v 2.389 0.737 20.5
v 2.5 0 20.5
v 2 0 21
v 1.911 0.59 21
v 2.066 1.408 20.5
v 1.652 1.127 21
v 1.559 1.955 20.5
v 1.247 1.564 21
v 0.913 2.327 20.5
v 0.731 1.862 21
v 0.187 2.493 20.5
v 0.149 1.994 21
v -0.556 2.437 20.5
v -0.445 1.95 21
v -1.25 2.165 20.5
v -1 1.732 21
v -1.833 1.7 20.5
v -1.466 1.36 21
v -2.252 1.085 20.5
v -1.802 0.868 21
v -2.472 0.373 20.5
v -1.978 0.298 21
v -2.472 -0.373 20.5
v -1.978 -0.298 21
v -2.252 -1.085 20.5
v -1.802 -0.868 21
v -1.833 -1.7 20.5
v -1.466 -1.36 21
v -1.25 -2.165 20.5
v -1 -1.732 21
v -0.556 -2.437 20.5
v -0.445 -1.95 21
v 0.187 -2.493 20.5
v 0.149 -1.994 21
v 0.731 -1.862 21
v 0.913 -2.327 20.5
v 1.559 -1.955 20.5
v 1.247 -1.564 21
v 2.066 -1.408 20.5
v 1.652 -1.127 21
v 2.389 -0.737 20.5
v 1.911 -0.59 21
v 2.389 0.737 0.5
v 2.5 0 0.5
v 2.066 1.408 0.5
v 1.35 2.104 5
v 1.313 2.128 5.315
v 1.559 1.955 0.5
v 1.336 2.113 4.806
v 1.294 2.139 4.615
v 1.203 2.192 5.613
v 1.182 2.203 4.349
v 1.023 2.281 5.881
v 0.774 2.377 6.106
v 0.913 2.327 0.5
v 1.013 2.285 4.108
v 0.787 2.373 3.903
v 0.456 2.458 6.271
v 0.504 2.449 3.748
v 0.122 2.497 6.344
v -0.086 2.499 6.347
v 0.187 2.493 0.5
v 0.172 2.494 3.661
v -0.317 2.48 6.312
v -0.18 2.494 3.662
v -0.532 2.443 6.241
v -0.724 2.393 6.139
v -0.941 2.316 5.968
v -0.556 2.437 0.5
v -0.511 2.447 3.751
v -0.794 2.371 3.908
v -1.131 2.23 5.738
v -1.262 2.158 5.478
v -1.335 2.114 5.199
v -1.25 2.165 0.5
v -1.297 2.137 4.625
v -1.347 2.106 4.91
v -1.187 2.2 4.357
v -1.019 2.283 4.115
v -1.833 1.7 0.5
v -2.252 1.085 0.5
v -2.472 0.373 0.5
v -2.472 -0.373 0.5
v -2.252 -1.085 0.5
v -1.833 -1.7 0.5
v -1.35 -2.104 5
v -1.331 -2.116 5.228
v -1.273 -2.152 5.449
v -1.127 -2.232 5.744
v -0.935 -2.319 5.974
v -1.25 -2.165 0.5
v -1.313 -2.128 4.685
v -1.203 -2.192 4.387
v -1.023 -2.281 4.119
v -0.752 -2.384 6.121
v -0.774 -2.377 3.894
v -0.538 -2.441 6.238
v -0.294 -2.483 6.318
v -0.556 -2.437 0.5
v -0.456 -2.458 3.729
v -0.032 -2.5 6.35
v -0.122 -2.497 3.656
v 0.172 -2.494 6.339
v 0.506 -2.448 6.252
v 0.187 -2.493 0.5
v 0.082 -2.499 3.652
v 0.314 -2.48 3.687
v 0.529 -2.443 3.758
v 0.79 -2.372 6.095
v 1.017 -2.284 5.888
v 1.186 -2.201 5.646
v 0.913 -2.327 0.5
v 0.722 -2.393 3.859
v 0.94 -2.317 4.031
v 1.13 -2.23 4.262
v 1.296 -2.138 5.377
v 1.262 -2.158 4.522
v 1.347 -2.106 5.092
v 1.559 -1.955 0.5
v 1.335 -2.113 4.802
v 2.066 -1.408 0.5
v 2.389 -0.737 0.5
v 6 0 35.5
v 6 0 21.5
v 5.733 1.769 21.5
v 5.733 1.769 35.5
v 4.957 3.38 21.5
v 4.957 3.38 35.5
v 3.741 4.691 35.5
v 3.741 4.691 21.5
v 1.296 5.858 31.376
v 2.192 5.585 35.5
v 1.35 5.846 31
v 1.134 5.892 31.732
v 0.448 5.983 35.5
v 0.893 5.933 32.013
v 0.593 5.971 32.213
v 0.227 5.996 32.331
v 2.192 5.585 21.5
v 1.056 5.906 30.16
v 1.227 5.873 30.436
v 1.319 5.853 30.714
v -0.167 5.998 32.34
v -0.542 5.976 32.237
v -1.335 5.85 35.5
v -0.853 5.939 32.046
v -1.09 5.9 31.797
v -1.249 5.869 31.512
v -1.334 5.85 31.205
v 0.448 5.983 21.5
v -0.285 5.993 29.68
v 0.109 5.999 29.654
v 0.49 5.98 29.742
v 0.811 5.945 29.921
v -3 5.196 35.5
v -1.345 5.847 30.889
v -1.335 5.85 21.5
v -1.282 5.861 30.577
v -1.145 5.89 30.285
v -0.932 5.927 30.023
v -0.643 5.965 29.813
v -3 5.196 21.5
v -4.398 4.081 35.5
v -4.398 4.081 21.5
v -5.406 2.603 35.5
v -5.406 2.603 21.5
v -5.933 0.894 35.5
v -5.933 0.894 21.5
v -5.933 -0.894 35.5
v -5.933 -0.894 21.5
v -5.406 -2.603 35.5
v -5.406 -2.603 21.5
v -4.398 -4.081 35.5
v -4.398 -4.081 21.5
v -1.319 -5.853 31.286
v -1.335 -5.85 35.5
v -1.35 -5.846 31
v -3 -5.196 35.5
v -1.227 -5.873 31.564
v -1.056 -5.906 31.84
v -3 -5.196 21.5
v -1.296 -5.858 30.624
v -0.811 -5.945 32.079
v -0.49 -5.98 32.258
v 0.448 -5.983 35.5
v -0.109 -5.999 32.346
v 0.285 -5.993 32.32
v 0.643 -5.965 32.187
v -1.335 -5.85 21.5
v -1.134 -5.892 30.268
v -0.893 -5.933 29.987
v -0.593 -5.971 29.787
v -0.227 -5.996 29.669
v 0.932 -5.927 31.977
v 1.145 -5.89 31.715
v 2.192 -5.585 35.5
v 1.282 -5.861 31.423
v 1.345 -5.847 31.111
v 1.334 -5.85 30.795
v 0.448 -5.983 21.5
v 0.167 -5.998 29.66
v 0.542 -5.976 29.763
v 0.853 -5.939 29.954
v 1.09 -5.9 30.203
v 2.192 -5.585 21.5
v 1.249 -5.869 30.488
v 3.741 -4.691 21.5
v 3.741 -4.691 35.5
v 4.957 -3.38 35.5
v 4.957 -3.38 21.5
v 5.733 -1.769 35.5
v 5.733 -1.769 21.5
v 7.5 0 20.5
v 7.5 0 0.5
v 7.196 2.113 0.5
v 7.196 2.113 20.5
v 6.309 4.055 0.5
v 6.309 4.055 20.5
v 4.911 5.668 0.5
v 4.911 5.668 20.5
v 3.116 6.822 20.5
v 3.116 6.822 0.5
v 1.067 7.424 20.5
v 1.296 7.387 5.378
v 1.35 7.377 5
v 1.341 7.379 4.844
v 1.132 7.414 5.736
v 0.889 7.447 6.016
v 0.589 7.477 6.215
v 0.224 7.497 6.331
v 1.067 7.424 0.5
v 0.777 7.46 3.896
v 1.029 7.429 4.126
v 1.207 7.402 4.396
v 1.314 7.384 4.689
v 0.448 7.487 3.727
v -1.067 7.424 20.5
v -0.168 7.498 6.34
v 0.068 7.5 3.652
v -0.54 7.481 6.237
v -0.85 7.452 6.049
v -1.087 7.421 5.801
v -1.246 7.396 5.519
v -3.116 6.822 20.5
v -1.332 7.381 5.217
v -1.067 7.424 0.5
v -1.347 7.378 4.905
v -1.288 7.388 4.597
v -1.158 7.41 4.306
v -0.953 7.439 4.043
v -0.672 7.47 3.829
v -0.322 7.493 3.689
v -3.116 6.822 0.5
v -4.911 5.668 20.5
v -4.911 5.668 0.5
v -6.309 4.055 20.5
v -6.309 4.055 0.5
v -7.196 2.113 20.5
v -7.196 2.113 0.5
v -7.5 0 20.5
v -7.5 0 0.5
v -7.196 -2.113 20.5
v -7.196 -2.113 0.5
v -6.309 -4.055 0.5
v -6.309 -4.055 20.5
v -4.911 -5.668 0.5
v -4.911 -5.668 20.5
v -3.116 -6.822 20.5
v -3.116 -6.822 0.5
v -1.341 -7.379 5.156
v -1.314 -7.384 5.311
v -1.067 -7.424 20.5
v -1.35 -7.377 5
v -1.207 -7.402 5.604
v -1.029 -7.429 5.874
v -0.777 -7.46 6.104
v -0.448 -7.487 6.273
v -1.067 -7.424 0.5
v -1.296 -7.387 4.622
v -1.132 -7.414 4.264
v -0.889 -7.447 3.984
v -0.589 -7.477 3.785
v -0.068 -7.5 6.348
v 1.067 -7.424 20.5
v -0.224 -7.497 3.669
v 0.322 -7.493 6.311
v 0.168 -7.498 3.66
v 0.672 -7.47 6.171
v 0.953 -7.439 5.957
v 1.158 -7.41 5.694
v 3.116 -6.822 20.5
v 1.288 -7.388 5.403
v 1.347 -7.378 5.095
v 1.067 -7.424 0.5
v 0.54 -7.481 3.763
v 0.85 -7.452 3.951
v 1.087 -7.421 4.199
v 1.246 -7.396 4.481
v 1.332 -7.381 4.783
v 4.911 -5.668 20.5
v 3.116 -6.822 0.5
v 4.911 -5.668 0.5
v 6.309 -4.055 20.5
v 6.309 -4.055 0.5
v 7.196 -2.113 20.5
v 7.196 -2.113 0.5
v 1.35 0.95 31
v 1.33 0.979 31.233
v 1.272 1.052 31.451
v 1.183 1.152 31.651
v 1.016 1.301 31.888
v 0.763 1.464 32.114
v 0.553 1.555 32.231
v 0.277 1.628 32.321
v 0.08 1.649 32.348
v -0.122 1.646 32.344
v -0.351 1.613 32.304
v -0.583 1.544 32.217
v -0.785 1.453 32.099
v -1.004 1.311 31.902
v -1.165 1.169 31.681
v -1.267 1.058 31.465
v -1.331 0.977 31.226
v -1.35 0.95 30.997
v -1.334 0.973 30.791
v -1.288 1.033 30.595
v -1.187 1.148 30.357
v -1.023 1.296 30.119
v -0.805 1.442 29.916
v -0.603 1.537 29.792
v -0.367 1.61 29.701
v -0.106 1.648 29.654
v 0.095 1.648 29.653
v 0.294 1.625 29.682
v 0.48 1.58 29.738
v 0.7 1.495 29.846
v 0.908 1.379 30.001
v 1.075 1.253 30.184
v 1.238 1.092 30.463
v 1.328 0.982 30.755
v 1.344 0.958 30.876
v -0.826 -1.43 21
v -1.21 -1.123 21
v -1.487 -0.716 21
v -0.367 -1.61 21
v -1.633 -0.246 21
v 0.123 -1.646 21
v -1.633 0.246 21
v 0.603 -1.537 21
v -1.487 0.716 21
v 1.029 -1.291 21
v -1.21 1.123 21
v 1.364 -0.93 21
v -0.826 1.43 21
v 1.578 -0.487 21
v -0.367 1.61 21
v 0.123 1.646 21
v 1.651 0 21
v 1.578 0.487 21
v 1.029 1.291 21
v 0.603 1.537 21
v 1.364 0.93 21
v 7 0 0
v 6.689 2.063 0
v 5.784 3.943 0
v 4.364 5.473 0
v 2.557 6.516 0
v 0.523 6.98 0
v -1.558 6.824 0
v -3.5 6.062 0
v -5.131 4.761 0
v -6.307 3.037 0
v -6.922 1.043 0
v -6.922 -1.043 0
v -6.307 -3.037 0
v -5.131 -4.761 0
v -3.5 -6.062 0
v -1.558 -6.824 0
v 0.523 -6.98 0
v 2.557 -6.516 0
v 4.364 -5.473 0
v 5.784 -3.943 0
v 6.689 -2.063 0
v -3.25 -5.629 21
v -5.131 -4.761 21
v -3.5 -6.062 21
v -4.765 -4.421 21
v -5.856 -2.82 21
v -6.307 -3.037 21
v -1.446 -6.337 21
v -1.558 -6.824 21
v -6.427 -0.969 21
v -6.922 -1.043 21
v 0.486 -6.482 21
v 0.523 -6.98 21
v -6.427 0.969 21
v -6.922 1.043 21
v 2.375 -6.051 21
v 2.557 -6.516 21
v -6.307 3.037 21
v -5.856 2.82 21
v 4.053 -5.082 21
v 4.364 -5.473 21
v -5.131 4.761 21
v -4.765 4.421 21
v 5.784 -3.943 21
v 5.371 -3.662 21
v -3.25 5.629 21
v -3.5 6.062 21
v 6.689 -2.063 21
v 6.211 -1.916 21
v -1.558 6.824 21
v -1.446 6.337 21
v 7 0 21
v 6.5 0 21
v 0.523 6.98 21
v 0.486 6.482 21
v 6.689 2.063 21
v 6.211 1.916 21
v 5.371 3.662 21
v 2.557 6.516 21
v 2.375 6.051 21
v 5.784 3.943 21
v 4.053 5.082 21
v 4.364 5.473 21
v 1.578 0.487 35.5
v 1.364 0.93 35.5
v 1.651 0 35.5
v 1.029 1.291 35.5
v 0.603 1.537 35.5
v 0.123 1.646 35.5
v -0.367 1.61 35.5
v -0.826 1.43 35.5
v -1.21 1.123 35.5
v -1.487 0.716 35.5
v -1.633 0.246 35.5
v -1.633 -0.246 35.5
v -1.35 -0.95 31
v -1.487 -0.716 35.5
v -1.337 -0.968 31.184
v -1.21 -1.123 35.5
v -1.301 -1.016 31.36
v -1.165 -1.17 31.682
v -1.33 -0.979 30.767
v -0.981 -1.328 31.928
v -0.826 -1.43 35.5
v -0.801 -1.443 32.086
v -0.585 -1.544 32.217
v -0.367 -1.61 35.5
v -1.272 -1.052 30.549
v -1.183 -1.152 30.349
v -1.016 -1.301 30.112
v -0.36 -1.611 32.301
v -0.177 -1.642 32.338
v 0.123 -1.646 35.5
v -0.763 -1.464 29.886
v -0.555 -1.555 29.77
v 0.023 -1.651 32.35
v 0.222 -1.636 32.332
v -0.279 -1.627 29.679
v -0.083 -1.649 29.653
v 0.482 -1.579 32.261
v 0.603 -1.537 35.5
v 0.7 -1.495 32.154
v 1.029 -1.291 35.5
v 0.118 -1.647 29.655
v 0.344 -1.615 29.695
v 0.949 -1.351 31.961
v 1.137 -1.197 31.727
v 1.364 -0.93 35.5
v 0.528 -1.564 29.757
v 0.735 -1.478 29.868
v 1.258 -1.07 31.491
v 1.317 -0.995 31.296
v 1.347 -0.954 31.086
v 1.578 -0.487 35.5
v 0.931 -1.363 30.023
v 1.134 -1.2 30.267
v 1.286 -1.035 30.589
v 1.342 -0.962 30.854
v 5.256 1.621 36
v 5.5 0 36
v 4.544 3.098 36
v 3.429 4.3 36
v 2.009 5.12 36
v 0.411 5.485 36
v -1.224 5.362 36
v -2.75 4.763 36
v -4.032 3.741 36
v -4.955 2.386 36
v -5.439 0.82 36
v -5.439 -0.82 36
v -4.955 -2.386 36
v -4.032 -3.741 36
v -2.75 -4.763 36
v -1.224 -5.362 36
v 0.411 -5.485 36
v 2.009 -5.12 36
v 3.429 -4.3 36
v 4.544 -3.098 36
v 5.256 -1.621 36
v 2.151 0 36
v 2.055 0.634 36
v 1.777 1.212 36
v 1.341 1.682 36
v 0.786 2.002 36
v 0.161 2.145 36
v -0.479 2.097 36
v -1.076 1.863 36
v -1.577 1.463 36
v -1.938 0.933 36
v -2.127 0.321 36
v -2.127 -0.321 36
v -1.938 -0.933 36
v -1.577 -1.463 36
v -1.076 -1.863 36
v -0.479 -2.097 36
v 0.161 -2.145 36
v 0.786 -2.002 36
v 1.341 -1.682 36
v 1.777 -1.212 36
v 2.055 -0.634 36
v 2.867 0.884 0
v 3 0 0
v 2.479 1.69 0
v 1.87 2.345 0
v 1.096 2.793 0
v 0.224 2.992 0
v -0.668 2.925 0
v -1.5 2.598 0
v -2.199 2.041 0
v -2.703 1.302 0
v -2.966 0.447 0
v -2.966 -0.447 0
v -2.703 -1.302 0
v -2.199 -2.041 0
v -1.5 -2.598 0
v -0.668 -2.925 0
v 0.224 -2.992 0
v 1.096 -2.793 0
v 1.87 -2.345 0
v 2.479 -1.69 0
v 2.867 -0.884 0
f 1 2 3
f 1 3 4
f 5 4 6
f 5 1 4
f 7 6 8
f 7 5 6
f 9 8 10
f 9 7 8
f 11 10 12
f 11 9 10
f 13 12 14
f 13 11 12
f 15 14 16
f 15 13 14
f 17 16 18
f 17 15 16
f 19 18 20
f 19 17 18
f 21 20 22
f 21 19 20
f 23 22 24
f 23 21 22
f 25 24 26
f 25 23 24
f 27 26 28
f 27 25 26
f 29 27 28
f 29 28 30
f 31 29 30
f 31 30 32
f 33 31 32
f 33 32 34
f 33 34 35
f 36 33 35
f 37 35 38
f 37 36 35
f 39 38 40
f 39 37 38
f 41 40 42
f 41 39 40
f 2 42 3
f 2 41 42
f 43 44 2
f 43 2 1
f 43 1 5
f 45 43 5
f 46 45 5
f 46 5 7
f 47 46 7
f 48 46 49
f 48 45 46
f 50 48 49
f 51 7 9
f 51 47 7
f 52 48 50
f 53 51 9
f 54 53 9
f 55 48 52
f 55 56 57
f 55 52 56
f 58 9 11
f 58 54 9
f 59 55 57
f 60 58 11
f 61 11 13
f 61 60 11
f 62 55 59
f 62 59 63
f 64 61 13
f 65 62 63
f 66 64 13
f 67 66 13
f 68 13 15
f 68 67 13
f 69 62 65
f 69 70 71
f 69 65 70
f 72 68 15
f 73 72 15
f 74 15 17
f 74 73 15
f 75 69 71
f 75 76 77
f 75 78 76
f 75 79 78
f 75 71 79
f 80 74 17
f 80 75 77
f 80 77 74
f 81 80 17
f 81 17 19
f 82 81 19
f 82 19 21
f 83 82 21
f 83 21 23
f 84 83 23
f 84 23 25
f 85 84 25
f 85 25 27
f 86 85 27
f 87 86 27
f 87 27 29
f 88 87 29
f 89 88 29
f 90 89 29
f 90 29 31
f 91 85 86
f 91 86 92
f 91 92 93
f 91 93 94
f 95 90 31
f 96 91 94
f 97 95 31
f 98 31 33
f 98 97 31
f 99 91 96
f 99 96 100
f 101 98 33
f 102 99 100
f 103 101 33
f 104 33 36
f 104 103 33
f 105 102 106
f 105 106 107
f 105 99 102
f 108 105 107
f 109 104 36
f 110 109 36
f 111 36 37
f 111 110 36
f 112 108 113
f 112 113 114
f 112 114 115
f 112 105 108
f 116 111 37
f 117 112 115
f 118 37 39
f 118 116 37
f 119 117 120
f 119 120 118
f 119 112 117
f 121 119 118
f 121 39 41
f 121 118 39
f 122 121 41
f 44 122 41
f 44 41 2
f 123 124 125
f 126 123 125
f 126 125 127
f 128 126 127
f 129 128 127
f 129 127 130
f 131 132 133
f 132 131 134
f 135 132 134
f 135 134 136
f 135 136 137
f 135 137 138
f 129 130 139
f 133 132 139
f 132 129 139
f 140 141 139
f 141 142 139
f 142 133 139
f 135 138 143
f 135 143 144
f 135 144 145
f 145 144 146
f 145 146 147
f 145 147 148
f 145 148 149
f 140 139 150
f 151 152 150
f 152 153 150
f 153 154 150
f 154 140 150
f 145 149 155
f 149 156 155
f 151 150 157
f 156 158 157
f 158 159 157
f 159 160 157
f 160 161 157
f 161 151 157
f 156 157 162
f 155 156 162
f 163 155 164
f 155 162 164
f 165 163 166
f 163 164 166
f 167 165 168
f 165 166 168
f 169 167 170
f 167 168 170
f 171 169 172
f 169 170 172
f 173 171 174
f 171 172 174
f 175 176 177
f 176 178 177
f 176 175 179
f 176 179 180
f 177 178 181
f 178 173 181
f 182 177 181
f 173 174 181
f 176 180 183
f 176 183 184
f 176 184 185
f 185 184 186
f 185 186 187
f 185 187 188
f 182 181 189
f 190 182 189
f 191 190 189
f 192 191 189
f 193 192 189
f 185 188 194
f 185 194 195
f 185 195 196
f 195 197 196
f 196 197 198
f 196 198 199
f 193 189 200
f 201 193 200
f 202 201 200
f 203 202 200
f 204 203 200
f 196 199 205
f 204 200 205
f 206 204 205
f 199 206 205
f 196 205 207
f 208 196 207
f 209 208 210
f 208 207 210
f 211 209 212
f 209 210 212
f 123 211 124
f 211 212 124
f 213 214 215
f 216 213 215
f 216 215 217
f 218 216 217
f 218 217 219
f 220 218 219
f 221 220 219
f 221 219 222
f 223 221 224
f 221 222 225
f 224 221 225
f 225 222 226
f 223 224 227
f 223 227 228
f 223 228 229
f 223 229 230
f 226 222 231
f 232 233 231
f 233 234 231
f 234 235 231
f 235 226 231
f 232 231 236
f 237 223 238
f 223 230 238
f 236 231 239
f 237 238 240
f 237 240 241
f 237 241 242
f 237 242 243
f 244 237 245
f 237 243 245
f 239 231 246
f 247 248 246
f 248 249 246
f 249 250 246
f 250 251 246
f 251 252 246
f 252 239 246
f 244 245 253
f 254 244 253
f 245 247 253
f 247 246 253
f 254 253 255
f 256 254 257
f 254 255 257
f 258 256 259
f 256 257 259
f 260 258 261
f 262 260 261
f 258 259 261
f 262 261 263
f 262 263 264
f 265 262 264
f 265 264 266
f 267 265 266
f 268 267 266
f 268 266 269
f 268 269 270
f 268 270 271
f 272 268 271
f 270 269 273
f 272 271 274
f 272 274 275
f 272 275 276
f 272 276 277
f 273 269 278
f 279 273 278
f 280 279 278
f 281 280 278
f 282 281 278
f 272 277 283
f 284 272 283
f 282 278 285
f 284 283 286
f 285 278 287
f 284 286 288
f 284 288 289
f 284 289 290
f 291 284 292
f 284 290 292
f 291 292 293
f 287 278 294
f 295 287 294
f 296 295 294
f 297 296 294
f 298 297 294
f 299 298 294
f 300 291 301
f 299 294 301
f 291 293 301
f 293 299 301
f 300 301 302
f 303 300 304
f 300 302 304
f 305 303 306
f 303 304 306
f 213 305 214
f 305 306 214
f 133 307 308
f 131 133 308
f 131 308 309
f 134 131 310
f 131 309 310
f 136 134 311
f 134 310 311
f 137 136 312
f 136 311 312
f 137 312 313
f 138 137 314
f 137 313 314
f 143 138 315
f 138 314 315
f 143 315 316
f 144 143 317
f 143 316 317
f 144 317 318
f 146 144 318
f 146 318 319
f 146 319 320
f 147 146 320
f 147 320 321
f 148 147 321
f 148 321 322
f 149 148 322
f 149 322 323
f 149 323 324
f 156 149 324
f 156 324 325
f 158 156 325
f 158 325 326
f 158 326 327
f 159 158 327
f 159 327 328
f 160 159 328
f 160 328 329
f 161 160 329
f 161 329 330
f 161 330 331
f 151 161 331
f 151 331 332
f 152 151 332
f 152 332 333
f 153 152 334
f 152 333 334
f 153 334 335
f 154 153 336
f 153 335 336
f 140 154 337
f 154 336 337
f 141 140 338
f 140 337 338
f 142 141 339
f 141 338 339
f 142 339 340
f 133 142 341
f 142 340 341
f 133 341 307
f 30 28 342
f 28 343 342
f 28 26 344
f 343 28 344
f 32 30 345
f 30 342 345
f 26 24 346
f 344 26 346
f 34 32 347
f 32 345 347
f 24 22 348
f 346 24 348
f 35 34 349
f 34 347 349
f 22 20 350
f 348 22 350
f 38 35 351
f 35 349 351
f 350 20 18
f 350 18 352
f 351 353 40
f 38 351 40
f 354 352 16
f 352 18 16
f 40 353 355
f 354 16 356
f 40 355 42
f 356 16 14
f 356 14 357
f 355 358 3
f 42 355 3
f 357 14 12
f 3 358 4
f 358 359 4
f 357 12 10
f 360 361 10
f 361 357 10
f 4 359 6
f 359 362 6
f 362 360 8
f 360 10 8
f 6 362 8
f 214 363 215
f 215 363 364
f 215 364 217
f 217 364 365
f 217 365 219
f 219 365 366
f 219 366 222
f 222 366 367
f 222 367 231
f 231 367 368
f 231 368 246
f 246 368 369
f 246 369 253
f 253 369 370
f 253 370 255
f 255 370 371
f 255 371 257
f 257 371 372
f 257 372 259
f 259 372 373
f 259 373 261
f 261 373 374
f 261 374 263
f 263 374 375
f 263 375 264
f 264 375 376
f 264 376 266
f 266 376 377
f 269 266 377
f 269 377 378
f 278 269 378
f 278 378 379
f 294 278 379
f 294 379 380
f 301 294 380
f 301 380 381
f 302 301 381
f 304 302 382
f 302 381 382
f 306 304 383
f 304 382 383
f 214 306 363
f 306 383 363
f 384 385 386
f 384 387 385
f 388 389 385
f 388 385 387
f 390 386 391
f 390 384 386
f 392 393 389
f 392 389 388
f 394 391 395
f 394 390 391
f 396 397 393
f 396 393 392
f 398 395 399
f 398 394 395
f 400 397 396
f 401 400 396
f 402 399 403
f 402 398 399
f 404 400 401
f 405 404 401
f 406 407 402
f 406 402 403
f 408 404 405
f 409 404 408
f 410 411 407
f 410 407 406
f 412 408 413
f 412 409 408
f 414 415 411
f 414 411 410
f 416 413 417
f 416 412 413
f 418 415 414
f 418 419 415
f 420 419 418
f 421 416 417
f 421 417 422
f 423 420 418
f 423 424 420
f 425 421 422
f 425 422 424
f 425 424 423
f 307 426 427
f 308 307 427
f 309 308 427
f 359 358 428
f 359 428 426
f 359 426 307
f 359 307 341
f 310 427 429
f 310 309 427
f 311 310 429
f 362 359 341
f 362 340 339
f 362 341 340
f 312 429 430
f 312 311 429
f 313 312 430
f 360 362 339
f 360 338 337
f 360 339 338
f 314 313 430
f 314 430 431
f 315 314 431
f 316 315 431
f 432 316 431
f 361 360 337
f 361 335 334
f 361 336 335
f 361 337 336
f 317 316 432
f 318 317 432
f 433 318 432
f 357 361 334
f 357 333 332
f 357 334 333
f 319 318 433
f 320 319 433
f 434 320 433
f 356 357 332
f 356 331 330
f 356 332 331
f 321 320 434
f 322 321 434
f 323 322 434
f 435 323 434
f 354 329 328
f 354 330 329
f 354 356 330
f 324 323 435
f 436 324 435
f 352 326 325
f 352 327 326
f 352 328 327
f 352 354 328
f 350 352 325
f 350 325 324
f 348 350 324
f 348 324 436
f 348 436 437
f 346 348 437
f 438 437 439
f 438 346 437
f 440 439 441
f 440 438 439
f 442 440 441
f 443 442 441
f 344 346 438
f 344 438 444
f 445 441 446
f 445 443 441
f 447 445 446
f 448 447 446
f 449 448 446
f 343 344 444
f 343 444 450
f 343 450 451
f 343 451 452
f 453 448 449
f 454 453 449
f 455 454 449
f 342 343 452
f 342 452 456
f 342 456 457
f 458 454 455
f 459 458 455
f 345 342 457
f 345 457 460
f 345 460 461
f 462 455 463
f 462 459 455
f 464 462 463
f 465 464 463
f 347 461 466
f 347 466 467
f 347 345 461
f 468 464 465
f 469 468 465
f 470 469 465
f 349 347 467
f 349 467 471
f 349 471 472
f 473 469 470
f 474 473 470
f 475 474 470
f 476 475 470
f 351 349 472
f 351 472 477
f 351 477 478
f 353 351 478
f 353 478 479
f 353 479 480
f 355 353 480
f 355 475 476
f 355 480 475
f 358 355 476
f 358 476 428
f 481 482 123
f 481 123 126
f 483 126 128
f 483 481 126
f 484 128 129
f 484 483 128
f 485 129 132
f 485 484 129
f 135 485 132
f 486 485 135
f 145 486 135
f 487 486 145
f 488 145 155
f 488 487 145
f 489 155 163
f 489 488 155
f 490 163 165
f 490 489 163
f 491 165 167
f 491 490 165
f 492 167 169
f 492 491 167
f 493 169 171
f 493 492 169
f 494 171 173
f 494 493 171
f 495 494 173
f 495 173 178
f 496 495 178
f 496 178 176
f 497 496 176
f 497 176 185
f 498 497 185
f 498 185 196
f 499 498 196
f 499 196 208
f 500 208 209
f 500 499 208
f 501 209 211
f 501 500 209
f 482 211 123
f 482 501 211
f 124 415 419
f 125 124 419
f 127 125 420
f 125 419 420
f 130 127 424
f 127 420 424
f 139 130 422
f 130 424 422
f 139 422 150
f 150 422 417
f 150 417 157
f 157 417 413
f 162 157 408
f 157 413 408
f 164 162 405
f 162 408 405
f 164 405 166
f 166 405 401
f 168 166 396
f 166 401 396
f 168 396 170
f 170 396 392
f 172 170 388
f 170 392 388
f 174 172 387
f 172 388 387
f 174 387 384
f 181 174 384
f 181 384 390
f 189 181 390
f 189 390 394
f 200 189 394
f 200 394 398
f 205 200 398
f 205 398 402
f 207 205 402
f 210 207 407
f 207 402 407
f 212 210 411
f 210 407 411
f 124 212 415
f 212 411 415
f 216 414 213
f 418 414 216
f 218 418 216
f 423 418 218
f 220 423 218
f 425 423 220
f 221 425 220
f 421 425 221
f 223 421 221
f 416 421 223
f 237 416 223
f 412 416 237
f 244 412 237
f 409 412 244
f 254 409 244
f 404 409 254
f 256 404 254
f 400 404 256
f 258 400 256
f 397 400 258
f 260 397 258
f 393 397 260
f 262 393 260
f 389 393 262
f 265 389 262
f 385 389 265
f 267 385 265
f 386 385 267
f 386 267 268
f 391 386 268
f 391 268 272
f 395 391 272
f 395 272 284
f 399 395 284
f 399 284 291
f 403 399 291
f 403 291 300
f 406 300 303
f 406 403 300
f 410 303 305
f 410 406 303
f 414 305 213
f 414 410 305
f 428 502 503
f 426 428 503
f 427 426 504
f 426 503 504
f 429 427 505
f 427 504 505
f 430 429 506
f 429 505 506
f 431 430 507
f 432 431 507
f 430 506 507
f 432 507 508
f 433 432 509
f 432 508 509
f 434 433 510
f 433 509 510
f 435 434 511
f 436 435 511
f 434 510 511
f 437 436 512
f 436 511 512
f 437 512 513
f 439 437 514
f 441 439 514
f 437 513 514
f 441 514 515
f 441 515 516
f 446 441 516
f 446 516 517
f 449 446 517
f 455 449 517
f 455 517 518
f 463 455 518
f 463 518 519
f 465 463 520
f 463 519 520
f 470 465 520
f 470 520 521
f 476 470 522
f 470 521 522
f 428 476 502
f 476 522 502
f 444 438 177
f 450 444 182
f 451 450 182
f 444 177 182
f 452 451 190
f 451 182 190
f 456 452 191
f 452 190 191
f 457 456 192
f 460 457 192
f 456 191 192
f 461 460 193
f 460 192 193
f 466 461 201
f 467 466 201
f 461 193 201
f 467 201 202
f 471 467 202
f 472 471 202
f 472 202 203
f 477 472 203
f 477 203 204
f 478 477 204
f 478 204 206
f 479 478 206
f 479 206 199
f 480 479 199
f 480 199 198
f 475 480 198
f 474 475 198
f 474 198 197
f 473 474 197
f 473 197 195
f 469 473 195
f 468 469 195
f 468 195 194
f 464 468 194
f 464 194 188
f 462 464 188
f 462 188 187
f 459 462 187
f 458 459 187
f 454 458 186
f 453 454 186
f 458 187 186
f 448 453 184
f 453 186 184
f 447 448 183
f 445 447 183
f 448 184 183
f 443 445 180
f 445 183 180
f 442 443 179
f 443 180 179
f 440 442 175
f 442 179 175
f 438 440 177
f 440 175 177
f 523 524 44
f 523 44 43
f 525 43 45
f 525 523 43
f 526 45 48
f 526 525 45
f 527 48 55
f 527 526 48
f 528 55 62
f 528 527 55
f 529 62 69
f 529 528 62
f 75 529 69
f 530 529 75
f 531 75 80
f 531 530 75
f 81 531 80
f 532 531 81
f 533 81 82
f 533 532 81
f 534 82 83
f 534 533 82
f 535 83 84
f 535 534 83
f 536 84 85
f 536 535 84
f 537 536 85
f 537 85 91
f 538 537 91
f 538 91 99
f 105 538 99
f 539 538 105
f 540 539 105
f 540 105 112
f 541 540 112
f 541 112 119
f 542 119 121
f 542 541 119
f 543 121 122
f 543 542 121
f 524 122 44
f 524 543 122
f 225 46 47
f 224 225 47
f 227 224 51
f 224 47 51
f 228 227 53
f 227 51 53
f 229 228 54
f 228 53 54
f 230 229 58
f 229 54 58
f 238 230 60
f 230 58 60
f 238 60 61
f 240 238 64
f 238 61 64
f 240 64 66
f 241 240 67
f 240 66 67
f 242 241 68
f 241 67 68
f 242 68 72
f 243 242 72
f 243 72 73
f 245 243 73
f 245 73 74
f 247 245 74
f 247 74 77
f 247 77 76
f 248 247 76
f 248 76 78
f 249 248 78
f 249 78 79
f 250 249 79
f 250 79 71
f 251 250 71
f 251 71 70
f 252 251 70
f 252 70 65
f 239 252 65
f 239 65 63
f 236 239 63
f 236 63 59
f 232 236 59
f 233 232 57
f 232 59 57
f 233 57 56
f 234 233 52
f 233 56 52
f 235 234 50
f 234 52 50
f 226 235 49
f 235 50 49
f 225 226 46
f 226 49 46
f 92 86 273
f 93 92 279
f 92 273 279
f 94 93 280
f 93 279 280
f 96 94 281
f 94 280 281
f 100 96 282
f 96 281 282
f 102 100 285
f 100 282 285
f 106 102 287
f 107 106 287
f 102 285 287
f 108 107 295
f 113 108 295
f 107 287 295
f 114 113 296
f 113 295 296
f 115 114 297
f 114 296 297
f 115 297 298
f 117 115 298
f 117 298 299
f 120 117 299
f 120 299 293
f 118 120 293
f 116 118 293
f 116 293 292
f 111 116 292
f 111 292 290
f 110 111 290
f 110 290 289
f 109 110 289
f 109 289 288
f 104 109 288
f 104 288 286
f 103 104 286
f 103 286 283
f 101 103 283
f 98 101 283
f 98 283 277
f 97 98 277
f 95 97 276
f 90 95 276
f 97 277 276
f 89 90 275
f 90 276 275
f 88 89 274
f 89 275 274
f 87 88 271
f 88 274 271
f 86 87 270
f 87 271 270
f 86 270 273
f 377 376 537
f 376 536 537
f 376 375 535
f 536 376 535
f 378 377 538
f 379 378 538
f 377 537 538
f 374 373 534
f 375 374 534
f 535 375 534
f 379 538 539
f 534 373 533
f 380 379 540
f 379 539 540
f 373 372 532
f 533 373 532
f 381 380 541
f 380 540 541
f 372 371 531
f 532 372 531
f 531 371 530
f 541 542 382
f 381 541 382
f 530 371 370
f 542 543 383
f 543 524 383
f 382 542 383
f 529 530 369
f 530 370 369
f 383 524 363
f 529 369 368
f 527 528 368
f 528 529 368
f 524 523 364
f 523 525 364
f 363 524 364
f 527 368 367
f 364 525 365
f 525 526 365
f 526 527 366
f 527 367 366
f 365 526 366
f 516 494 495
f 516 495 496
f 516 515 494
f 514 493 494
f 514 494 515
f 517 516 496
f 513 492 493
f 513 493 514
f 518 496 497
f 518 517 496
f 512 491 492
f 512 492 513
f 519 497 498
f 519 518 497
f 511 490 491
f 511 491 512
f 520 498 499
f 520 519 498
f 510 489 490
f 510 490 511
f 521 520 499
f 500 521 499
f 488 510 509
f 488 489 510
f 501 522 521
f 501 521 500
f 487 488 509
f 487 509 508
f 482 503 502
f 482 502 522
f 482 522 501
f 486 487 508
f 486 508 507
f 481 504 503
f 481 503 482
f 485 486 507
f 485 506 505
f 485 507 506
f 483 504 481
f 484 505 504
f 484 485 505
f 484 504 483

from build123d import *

# Parameters (mm, degrees)
F0_R     = 7.5
F0_R_2   = 2.5
F1_DEPTH = 21
F2_R     = 6
F2_R_2   = 1.651
F3_DEPTH = 15
F5_D     = 2.7
F5_DEPTH = 7.501
F6_D     = 2.7
F7_SIZE  = 0.5


with BuildPart() as f1:
    # F0 (on Top) → F1 (new body)
    with BuildSketch(Plane.XY):
        Circle(F0_R)
        Circle(F0_R_2, mode=Mode.SUBTRACT)
    extrude(amount=F1_DEPTH)

    # F2 (on face) → F3 (join)
    with BuildSketch(Plane.XY.offset(21)):
        Circle(F2_R)
        Circle(F2_R_2, mode=Mode.SUBTRACT)
    extrude(amount=F3_DEPTH)

    # F5 (through all, one way)
    with BuildSketch(Plane.XZ):
        with Locations((0, 5), (0, 31)):
            Circle(F5_D / 2)
    extrude(amount=-F5_DEPTH, mode=Mode.SUBTRACT)

    # F6 (through all)
    with Locations(Plane(origin=(0, 0, 0), x_dir=(1, 0, 0), z_dir=(0, 1, 0))):
        with Locations((0, -5), (0, -31)):
            Hole(F6_D / 2)

    # F7
    f7_edges = [f1.edges().sort_by_distance(p)[0] for p in [
        (-7.5, 0, 0),
        (-7.5, 0, 21),
        (-6, 0, 36),
        (-2.5, 0, 0),
        (-6, 0, 21),
        (-2.5, 0, 21),
        (-1.651, 0, 36),
    ]]
    chamfer(f7_edges, length=F7_SIZE)


solid = f1.part
